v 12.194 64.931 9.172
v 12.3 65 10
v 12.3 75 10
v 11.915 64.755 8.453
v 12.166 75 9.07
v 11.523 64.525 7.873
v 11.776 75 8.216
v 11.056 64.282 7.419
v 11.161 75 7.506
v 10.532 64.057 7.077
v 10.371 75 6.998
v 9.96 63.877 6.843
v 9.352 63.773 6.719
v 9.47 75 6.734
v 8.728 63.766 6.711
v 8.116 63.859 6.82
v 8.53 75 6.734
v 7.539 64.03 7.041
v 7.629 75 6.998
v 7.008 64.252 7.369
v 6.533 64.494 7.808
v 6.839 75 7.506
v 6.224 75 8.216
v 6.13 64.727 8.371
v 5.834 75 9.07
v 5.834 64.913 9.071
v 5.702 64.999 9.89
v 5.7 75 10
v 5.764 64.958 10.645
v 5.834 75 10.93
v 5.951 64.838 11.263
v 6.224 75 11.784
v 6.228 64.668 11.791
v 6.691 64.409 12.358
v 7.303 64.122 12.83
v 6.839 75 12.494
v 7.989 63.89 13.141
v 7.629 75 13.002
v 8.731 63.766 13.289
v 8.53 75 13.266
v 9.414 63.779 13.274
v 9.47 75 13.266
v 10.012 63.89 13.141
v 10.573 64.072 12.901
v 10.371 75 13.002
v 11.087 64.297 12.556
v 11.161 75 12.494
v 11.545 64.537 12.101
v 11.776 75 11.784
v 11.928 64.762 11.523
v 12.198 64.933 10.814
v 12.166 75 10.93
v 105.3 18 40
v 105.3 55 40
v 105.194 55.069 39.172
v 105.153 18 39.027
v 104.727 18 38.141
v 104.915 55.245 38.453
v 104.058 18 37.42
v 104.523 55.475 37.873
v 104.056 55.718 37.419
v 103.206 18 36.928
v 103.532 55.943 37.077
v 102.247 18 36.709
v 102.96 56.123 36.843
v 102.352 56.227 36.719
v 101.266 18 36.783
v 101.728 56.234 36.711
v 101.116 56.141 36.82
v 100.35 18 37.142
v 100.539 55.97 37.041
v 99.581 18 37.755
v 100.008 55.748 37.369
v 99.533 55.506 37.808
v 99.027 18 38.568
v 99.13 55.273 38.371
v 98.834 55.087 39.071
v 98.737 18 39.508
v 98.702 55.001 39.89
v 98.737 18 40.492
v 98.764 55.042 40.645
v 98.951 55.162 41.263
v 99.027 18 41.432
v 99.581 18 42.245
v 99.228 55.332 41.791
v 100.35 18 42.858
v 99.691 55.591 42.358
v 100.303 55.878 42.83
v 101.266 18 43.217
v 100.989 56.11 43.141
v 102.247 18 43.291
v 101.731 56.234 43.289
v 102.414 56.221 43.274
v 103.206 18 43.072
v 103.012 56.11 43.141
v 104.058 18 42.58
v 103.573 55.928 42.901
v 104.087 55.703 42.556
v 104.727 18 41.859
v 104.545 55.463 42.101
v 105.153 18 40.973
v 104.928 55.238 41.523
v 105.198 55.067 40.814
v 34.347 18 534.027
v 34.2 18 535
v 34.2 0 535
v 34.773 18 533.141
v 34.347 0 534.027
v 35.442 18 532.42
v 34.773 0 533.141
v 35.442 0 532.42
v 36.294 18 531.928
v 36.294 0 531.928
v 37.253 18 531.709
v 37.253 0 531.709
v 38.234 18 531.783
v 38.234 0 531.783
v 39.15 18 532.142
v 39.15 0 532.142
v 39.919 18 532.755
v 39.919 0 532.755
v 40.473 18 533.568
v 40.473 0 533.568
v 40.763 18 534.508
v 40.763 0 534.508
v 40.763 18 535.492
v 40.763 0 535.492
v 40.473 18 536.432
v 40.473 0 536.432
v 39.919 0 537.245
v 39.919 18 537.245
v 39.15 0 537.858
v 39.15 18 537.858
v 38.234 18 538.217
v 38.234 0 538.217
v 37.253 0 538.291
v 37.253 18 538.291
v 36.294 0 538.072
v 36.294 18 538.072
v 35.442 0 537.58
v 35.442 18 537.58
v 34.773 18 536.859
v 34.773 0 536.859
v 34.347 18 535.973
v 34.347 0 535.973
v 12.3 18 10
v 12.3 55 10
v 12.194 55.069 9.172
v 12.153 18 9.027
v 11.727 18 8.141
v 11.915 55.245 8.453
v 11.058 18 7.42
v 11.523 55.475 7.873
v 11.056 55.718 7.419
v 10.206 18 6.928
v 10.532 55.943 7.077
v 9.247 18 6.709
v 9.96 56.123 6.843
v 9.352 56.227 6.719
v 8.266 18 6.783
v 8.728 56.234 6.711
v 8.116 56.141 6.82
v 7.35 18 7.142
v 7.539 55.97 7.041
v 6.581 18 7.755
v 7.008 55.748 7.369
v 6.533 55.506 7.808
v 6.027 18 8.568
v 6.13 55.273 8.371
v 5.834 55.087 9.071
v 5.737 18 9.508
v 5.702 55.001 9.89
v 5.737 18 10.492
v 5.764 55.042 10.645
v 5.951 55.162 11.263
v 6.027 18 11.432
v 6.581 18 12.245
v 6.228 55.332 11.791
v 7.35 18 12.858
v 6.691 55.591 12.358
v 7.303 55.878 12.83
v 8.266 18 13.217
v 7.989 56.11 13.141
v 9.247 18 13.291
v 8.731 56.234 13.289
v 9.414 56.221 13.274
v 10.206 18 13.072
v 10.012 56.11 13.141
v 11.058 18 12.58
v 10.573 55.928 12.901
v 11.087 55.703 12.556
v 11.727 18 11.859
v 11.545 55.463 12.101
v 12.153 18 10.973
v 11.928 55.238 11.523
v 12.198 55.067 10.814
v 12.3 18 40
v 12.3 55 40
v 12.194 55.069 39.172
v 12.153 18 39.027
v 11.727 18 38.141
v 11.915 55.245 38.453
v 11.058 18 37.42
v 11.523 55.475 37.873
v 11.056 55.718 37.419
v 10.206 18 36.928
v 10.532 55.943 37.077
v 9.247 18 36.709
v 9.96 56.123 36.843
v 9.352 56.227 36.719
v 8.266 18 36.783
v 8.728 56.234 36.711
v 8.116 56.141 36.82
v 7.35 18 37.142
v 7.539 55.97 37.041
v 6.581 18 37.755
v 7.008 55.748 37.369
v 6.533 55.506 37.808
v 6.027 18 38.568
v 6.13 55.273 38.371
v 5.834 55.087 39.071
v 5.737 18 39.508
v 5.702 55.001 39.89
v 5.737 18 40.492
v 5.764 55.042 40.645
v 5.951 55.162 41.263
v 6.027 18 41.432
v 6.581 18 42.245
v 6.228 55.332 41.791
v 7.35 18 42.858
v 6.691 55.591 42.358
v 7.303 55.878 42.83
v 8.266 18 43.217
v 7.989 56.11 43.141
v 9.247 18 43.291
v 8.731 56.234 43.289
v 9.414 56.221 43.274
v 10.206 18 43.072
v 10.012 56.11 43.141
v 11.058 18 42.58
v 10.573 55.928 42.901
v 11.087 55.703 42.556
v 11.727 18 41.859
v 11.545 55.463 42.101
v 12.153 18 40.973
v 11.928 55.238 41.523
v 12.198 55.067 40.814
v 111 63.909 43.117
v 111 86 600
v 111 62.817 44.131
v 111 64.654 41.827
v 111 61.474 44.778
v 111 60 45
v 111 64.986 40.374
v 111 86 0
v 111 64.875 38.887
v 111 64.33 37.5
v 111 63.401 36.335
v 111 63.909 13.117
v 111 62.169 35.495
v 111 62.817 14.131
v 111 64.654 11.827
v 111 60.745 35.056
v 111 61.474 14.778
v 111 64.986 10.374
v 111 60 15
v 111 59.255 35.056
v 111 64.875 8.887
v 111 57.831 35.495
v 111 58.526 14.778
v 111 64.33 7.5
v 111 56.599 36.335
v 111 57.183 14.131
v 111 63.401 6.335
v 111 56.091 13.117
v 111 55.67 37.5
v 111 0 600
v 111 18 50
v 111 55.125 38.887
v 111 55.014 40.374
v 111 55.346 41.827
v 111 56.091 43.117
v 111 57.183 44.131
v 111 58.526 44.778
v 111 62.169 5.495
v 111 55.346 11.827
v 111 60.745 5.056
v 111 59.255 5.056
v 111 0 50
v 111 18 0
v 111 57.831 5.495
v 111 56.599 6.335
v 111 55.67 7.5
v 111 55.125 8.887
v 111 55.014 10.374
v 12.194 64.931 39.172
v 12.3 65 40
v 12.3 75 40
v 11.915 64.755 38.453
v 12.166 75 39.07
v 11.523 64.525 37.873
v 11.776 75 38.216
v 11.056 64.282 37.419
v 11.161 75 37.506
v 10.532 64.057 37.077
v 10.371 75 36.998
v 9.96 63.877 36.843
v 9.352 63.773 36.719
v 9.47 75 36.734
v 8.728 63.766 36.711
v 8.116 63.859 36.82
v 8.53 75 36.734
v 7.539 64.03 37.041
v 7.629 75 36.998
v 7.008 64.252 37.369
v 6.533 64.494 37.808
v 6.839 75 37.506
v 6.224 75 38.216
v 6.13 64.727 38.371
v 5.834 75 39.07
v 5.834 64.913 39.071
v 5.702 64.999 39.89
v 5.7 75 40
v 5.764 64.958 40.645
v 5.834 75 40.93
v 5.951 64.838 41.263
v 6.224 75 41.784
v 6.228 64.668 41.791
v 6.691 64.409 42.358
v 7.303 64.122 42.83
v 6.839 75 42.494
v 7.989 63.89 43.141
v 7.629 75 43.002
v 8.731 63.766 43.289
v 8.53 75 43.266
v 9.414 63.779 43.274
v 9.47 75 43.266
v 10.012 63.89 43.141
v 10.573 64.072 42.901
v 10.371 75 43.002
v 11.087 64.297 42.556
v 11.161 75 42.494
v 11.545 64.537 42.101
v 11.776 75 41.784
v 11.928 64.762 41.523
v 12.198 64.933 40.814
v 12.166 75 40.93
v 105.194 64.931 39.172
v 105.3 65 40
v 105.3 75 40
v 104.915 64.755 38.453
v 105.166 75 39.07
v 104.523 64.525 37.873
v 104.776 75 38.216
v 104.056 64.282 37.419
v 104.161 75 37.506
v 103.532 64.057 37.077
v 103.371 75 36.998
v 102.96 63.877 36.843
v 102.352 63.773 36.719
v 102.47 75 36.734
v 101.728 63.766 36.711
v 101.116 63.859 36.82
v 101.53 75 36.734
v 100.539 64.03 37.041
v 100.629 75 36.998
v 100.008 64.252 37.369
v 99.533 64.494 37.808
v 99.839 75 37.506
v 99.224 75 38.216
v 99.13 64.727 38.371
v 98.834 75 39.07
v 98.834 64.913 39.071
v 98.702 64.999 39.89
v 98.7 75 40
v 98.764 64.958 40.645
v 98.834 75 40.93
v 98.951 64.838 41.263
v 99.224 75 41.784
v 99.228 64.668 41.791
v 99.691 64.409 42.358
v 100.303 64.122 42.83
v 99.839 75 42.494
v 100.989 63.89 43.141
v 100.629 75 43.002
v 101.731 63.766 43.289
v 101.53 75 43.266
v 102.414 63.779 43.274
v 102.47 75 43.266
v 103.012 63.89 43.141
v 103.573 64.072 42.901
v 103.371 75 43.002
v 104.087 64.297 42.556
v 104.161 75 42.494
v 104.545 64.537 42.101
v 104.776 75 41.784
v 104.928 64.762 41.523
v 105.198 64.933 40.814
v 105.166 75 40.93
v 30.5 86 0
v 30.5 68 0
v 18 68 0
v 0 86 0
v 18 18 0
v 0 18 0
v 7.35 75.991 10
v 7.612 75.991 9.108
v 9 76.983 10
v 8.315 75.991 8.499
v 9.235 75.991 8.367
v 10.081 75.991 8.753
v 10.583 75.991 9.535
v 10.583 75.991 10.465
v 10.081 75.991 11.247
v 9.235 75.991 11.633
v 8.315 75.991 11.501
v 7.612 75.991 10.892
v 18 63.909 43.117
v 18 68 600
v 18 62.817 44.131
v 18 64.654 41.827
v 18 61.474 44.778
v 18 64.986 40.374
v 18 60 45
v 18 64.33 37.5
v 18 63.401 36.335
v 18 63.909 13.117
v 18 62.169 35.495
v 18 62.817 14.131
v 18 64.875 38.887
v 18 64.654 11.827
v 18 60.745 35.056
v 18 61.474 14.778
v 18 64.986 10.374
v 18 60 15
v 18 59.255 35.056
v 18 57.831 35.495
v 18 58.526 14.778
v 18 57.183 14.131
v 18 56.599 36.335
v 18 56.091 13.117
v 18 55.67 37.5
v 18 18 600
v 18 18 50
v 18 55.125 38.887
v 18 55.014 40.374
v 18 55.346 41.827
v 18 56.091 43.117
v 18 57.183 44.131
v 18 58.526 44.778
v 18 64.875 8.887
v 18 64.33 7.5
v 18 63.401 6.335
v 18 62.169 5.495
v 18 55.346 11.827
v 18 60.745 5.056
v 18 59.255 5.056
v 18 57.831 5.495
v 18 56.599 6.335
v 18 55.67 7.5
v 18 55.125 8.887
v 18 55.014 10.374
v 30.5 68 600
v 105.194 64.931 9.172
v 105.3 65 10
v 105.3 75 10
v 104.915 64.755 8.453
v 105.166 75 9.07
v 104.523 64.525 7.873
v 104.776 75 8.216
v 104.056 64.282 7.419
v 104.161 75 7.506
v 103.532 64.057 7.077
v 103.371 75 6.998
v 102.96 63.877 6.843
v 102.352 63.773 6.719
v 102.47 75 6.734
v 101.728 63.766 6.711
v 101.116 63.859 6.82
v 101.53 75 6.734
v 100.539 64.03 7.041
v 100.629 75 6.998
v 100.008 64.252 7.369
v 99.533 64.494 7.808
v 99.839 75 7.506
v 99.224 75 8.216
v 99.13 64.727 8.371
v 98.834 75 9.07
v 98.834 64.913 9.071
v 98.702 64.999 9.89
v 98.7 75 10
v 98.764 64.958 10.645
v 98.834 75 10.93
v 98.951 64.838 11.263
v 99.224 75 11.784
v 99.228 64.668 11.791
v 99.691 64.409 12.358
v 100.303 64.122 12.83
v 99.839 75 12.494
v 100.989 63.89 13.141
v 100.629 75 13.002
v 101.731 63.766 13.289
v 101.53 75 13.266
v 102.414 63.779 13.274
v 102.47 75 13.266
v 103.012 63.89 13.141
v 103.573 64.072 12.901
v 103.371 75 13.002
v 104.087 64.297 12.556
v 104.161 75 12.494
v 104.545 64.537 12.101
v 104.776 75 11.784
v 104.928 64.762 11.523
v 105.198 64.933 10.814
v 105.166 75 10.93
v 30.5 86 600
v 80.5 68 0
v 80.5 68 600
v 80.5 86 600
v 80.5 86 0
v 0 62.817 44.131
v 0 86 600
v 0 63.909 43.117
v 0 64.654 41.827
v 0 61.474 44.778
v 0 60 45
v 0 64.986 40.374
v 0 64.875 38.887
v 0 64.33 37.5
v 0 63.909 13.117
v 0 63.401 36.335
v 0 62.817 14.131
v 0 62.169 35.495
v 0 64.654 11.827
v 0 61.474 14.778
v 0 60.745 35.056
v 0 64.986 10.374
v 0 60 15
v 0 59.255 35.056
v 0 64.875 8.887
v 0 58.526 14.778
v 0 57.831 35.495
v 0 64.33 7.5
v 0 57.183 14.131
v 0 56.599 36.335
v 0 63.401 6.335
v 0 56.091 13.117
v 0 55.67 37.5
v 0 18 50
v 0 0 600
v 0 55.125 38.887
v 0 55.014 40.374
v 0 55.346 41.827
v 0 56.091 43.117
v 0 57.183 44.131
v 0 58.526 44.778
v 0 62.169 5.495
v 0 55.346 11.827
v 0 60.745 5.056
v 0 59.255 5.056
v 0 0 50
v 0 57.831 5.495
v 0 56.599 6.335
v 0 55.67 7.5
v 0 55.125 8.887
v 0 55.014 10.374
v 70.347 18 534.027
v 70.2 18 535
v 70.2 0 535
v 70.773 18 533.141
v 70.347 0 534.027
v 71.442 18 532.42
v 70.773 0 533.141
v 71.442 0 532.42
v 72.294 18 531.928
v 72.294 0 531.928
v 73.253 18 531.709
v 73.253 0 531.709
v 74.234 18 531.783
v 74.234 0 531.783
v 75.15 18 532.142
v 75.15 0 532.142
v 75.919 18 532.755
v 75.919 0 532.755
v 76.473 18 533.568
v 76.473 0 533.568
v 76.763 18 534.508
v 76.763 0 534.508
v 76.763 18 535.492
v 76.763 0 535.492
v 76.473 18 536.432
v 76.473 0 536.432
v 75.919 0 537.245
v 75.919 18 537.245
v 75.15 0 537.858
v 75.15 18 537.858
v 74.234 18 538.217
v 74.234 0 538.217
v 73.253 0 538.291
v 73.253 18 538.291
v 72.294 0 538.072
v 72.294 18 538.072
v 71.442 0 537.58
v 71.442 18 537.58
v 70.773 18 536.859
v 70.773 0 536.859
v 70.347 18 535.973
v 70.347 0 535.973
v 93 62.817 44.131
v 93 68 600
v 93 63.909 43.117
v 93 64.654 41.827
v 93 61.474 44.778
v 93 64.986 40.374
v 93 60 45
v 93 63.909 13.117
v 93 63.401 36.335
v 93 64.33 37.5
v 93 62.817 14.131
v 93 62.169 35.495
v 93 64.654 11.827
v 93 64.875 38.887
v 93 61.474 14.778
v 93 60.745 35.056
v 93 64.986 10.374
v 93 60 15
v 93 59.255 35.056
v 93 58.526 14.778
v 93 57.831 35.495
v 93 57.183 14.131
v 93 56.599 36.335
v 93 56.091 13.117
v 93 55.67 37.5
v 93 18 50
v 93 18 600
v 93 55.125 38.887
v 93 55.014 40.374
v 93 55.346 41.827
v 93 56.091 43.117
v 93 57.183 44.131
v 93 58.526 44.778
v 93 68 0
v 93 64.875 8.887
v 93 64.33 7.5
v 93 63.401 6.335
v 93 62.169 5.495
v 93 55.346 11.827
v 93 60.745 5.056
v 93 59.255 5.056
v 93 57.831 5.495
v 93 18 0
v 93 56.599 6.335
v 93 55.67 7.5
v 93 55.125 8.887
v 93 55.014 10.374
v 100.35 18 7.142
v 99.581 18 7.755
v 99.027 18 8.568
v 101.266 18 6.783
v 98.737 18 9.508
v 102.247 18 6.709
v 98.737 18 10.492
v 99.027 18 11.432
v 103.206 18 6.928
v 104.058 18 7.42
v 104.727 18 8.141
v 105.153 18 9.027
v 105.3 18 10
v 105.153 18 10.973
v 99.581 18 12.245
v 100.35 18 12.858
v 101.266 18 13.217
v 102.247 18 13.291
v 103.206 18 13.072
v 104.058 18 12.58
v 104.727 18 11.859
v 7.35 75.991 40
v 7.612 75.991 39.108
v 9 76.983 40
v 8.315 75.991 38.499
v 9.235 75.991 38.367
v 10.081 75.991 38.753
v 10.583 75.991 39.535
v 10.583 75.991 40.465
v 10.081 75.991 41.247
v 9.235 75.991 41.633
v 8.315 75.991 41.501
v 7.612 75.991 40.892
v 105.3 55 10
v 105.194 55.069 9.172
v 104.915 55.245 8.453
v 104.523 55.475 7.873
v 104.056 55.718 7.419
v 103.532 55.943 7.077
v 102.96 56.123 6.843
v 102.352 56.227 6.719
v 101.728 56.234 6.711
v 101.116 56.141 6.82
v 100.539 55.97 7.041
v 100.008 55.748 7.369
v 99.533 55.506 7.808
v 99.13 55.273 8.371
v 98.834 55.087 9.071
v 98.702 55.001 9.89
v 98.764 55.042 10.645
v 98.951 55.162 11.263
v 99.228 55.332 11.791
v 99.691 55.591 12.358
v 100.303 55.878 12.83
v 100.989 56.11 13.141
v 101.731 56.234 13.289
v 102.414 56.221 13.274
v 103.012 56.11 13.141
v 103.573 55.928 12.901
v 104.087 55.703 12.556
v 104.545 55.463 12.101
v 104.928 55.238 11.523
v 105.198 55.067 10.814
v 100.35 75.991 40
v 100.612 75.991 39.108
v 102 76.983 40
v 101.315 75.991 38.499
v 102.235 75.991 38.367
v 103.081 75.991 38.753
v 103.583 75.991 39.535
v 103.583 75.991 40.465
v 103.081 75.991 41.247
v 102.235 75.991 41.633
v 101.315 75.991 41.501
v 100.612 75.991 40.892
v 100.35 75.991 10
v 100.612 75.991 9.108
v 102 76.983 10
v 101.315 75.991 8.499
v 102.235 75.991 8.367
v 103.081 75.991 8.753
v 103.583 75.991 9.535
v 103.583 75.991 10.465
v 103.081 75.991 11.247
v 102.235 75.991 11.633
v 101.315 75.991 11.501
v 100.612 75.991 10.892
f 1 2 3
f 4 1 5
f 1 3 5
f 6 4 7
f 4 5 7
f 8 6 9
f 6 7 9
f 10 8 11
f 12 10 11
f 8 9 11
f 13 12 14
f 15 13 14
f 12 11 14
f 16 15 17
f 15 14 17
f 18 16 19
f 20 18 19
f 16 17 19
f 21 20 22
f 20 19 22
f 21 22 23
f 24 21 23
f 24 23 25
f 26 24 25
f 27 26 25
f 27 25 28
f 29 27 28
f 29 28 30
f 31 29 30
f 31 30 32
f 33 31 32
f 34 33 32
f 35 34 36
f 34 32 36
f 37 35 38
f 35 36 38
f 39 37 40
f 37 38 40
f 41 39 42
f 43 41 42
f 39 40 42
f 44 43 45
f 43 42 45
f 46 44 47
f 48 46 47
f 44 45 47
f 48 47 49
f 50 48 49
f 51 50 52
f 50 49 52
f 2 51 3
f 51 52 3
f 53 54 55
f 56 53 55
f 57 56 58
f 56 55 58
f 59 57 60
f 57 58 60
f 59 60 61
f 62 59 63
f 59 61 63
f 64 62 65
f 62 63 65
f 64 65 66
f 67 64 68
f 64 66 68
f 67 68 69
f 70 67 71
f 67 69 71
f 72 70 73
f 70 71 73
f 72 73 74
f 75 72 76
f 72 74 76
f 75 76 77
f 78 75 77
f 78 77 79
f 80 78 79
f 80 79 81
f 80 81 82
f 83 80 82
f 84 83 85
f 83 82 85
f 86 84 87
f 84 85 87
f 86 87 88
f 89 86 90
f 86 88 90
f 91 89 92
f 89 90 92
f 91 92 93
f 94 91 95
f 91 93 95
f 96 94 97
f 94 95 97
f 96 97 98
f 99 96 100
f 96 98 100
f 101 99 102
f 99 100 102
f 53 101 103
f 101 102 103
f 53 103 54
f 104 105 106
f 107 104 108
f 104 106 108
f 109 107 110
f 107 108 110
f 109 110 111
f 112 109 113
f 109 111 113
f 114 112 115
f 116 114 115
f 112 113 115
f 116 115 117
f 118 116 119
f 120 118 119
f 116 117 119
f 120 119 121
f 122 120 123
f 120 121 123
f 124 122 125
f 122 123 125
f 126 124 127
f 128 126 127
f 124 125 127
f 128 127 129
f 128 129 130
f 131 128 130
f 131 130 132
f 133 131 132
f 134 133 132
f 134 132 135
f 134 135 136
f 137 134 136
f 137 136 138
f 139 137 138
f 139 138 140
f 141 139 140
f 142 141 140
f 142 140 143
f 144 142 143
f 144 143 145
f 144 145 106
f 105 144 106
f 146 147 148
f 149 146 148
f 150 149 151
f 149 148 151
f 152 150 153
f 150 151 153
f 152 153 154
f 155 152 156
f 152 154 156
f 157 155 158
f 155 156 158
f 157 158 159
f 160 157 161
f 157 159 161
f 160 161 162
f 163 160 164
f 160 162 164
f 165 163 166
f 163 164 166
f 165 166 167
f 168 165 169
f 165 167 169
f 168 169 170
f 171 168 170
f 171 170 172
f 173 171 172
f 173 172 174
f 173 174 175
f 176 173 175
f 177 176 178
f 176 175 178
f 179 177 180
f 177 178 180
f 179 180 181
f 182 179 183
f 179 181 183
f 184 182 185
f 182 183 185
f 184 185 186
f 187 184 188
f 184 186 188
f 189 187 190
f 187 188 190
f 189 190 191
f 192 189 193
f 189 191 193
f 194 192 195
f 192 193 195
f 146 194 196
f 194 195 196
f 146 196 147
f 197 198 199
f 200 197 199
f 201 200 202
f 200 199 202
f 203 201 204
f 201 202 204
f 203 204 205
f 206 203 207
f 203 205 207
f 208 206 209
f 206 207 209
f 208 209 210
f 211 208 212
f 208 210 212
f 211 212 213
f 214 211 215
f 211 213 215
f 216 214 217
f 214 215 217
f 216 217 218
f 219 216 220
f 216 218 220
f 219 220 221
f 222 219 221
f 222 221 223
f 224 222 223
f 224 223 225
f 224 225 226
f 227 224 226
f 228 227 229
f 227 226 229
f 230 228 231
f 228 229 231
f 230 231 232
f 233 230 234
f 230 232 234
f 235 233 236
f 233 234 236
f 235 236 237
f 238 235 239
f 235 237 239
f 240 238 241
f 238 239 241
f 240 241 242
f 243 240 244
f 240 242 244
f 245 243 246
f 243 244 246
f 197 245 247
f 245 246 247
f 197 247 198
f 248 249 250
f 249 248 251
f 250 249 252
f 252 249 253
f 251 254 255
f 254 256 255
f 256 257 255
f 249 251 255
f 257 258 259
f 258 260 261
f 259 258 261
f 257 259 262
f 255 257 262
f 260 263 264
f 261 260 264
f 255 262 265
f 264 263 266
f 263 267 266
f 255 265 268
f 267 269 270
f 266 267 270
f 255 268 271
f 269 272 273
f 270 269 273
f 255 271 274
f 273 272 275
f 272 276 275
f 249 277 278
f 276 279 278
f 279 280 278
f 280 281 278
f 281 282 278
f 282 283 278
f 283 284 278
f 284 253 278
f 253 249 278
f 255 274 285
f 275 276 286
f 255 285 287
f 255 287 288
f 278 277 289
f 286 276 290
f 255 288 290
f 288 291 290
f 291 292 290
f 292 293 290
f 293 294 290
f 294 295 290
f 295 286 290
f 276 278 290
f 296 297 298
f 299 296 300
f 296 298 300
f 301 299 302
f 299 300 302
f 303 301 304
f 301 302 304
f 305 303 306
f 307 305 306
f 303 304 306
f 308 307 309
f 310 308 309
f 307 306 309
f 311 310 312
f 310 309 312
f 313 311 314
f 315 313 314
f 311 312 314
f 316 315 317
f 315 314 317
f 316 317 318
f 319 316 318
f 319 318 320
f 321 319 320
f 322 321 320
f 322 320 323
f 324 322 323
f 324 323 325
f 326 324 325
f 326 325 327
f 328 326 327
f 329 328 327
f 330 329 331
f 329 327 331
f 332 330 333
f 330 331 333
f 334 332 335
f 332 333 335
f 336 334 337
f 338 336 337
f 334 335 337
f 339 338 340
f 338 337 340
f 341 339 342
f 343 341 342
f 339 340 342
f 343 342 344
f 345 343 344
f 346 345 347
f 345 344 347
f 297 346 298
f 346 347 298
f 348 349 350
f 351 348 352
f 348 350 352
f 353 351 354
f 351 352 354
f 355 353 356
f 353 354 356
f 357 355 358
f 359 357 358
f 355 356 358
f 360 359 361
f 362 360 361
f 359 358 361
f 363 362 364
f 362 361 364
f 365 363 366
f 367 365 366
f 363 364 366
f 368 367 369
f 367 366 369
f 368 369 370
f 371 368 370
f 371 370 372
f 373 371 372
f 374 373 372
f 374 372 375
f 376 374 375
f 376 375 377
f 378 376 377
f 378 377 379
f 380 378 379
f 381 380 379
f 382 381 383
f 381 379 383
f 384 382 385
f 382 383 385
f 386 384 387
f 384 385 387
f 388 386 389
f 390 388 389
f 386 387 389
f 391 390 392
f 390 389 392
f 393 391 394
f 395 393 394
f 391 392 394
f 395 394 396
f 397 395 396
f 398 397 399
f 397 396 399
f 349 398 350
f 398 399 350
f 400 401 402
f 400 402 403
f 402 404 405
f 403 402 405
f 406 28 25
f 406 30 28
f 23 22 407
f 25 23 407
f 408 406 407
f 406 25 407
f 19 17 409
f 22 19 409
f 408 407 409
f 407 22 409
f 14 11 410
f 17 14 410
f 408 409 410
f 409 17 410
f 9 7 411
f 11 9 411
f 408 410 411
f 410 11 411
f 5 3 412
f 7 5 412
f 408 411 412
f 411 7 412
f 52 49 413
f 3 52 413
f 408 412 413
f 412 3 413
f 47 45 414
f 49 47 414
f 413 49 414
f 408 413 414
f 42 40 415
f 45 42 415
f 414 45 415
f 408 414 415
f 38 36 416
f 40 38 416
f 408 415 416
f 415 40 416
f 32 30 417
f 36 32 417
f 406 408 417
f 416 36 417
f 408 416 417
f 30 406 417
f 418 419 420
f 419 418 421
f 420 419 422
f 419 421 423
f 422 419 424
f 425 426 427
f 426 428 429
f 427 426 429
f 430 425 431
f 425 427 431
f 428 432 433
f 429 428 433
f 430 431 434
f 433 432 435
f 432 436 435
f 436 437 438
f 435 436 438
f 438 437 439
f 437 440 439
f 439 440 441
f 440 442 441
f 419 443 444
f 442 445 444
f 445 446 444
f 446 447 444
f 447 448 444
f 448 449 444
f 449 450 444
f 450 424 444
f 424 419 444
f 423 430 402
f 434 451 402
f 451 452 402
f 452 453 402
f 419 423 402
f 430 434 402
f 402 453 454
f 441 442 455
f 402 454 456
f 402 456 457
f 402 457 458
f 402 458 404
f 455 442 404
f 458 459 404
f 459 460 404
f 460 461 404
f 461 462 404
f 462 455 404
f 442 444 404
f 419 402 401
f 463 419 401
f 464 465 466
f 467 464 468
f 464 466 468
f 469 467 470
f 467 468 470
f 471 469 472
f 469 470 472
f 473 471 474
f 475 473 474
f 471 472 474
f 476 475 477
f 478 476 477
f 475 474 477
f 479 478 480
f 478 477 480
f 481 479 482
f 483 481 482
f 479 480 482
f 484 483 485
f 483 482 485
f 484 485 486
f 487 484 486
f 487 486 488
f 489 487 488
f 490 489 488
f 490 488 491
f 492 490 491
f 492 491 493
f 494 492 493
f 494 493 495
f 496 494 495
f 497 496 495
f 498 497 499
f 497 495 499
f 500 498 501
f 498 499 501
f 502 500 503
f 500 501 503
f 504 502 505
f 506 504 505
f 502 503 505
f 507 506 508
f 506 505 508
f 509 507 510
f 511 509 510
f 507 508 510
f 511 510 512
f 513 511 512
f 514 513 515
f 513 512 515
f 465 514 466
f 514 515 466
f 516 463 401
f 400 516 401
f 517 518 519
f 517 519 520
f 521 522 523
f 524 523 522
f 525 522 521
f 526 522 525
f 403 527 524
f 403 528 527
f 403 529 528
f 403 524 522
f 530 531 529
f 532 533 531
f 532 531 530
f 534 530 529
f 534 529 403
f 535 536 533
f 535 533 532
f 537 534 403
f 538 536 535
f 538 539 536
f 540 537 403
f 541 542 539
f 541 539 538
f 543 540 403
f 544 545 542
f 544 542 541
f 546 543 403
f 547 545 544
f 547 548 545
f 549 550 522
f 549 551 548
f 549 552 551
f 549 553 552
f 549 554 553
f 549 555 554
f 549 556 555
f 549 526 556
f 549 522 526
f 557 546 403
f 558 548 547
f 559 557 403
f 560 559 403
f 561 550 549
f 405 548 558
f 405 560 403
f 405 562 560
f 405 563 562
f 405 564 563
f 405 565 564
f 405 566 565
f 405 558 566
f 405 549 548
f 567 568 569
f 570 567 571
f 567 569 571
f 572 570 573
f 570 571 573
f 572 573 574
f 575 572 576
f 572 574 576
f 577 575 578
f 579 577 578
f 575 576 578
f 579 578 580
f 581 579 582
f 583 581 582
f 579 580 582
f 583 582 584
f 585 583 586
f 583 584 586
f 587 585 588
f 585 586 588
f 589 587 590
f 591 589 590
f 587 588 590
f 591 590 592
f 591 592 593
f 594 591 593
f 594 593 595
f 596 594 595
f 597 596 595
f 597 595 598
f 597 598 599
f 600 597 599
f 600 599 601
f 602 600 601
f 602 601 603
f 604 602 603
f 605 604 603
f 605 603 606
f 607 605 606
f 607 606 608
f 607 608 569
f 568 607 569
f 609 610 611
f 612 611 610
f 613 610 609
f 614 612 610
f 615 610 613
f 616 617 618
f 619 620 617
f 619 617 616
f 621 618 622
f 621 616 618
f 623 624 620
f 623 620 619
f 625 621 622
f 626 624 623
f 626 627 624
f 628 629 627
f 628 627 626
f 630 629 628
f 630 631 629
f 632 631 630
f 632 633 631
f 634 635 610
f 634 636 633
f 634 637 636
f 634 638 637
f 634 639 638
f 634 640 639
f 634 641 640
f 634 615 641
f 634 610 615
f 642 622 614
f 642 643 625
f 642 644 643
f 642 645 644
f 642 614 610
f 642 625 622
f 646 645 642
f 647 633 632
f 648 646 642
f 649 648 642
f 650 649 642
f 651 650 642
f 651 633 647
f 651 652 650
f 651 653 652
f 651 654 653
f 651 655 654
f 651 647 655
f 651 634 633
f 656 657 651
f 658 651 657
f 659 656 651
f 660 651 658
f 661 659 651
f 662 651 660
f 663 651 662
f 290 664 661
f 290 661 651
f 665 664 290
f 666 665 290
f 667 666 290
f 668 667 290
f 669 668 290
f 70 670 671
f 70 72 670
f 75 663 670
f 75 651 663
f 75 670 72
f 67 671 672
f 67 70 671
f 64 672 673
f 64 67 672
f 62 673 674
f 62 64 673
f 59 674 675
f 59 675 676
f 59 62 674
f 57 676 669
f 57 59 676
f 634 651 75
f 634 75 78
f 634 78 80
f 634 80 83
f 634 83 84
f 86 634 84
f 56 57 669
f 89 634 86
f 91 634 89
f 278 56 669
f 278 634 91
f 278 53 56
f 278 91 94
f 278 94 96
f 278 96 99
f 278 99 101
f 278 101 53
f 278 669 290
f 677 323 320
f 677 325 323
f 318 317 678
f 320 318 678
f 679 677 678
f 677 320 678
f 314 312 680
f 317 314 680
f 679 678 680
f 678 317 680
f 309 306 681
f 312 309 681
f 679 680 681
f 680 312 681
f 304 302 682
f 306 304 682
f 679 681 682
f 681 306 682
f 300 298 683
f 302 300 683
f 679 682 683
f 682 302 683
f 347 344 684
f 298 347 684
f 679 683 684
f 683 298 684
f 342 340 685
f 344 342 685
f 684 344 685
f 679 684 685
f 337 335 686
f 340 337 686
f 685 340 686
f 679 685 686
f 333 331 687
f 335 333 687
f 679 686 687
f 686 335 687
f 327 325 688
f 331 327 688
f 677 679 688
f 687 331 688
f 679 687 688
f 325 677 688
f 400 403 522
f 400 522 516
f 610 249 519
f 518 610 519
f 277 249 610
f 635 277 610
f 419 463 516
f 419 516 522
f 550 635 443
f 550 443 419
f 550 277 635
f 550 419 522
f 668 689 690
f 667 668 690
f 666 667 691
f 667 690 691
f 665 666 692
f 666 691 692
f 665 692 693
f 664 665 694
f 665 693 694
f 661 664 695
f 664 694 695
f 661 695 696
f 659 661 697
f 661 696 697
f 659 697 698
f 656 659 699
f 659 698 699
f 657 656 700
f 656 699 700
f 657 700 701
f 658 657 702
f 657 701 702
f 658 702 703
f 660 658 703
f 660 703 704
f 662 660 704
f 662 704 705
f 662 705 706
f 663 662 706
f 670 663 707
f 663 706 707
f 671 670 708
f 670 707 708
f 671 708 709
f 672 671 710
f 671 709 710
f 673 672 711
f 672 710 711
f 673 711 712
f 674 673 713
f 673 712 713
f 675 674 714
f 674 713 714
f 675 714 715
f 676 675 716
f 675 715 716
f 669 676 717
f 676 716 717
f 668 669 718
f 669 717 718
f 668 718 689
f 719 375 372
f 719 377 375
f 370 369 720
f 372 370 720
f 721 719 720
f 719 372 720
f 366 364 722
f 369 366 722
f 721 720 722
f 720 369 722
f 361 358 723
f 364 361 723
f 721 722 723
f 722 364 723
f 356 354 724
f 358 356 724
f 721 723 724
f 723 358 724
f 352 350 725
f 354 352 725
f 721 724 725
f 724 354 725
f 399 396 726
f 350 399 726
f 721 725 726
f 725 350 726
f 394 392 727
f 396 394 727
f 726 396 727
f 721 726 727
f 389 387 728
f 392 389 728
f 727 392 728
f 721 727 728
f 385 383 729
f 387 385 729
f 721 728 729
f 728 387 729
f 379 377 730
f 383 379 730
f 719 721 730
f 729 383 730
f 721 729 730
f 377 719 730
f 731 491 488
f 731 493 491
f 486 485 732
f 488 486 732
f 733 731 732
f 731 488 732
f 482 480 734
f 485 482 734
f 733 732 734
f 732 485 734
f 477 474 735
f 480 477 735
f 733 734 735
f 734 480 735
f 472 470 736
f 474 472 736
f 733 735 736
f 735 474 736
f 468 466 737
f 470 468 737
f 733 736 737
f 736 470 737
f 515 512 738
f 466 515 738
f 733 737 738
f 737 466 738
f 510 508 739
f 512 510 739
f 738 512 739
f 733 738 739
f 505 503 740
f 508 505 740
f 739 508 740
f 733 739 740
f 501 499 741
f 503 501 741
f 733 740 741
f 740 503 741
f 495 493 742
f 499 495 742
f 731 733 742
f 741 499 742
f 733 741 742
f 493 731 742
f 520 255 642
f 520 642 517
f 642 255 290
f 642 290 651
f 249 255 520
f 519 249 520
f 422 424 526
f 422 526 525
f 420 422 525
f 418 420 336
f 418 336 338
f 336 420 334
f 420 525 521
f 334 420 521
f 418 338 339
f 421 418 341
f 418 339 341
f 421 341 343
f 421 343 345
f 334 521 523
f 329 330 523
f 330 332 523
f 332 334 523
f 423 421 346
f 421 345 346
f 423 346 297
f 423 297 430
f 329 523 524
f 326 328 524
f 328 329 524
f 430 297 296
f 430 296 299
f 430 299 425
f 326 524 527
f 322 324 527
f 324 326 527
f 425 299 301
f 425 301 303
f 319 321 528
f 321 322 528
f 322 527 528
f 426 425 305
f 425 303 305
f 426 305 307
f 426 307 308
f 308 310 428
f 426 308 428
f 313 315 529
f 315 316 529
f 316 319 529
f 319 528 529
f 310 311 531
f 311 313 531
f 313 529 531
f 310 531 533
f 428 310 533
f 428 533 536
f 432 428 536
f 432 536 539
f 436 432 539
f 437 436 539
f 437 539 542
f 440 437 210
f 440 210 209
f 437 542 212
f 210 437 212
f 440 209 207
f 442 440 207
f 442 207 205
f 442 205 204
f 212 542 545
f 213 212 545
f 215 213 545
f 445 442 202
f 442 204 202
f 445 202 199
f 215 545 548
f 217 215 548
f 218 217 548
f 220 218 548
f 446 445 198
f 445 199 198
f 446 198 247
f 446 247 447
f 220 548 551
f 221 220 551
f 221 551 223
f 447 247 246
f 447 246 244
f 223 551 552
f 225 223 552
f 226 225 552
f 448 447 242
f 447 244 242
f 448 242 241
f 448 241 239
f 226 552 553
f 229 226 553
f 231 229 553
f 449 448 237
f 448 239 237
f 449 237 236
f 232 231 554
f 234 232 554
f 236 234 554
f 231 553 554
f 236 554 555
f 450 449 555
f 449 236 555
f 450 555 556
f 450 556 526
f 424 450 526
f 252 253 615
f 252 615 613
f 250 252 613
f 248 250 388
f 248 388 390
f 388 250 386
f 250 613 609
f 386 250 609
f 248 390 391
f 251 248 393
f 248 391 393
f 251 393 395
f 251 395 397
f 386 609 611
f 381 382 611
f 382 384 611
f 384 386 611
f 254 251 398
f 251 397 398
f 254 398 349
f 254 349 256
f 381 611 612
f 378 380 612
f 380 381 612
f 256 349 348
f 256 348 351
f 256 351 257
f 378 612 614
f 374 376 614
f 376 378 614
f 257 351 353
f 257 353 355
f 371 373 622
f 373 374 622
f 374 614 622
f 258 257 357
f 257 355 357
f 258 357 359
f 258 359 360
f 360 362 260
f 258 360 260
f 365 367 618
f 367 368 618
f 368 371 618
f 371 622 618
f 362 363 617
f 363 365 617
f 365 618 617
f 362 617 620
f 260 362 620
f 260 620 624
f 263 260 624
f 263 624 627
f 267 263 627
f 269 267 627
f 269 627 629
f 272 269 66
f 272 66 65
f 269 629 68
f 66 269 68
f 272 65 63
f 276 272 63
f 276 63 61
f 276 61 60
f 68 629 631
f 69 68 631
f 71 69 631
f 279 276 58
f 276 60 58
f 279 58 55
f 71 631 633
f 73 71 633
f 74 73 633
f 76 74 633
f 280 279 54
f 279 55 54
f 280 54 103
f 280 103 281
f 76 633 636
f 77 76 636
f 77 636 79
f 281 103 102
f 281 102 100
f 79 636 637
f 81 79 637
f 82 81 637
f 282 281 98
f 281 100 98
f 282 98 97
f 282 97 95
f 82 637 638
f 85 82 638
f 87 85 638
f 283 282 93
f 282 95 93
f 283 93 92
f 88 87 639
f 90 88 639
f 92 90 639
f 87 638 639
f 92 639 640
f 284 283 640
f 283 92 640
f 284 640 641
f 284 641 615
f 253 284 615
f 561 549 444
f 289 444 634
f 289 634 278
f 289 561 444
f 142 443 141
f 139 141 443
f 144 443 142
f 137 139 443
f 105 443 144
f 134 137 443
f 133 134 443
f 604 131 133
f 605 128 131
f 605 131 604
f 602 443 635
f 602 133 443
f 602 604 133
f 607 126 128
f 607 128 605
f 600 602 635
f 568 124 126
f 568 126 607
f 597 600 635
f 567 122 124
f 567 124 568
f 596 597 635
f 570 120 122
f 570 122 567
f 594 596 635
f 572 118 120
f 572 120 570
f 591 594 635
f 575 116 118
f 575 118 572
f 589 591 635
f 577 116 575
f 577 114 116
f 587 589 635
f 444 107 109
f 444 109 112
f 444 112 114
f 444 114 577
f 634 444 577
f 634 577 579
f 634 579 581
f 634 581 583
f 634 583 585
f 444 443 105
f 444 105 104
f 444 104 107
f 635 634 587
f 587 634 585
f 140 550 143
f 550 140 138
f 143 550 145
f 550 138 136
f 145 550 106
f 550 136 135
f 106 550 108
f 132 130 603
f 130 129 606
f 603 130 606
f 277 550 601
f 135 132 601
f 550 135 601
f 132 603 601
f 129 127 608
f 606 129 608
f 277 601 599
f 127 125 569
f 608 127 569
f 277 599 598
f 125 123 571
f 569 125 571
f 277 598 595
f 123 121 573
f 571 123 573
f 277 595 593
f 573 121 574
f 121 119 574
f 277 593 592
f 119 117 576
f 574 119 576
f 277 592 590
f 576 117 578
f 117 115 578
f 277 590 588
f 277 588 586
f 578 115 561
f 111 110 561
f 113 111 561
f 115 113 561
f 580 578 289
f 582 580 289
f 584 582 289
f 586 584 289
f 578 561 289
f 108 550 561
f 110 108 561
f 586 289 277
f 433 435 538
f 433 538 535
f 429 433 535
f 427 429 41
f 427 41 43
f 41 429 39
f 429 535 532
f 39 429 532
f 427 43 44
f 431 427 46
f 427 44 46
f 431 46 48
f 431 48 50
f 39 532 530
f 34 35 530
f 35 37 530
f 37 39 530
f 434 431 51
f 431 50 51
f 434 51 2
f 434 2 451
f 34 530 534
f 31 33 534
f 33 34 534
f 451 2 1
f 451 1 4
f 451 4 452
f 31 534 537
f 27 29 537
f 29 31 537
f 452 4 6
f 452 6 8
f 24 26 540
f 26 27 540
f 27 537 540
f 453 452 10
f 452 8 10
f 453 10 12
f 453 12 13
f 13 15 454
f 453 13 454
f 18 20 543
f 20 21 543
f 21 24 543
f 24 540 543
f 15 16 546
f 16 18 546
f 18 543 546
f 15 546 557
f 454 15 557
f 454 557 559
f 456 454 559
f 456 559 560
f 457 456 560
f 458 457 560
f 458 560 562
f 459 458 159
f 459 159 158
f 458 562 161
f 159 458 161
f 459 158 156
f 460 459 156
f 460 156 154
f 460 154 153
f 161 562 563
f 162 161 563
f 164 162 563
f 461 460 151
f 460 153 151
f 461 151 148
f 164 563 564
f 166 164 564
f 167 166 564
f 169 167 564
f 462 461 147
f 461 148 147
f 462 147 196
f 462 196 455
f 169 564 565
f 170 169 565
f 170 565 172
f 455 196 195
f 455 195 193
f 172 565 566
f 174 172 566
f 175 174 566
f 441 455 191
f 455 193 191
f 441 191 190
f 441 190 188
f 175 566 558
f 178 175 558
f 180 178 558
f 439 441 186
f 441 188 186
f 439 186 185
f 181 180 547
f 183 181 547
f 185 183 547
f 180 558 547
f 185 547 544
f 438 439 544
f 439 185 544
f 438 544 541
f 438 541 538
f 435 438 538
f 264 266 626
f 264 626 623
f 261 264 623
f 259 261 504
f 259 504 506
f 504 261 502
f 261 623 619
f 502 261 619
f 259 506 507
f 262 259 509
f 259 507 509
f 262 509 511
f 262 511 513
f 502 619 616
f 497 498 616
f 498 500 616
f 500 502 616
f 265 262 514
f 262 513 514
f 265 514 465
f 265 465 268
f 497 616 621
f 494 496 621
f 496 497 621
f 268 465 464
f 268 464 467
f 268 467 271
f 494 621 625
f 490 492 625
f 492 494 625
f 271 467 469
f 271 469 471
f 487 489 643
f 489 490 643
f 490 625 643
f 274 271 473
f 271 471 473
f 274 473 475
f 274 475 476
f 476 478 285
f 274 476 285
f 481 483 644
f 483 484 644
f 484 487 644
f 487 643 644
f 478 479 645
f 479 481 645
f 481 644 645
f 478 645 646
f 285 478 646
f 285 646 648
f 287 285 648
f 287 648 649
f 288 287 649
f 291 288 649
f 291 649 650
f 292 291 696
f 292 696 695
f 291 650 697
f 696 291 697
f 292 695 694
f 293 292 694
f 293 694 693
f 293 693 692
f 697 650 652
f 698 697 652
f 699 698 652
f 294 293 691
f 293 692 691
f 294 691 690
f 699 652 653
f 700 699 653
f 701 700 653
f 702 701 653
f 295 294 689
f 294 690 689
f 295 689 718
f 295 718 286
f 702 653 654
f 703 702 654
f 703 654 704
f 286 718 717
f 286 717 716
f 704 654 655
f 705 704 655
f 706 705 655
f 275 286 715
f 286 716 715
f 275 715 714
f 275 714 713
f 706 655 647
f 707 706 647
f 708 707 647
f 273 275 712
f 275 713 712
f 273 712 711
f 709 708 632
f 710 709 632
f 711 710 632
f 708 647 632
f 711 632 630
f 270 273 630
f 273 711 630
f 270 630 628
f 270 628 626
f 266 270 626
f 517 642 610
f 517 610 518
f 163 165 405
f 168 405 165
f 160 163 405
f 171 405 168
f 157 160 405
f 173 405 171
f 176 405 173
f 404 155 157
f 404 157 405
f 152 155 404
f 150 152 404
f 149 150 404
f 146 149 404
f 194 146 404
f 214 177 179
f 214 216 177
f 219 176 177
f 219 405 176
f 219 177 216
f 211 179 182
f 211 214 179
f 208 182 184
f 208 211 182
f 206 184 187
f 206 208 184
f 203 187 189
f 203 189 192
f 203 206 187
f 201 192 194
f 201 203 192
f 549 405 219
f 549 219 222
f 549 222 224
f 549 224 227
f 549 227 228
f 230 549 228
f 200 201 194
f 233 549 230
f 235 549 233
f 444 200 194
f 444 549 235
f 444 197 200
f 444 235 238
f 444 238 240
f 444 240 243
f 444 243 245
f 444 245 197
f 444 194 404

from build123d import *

# Parameters (mm, degrees)
SKETCH1_W                                  = 111
SKETCH1_H                                  = 18
BASEPLATE_DEPTH                            = 600
SKETCH2_W                                  = 18
SKETCH2_H                                  = 600
SIDE_RAIL_DEPTH                            = 50
SKETCH3_W                                  = 30.5
SKETCH3_H                                  = 600
KEEPER_RAIL_DEPTH                          = 18
SKETCH5_W                                  = 111
SKETCH5_H                                  = 50
LAP_JOINT_CUTOUT_DEPTH                     = 18
LAP_JOINT_BOLT_HOLE_PATTERN_D              = 6.6
LAP_JOINT_BOLT_HOLE_PATTERN_DEPTH          = 57
LAP_JOINT_BOLT_HOLE_PATTERN_TIP            = 1.982840043
FIXED_BEARING_BLOCK_BOLT_CLEARANCE_HOLES_D = 6.6
CROSS_DOWEL_BOLT_CLEARANCE_HOLES_D         = 10


with BuildPart() as part:
    # Sketch1 → baseplate (new body)
    with BuildSketch(Plane.XY):
        with Locations((55.5, 9)):
            Rectangle(SKETCH1_W, SKETCH1_H)
    extrude(amount=BASEPLATE_DEPTH)

    # Sketch2 → side_rail (add)
    with BuildSketch(Plane(origin=(0, 18, 0), x_dir=(1, 0, 0), z_dir=(0, 1, 0))):
        with Locations((9, -300)):
            Rectangle(SKETCH2_W, SKETCH2_H)
    side_rail = extrude(amount=SIDE_RAIL_DEPTH)

    # Sketch3 → keeper rail (add)
    with BuildSketch(Plane(origin=(0, 68, 0), x_dir=(1, 0, 0), z_dir=(0, 1, 0))):
        with Locations((15.25, -300)):
            Rectangle(SKETCH3_W, SKETCH3_H)
    keeper_rail = extrude(amount=KEEPER_RAIL_DEPTH)

    # mirror rails: side_rail, keeper rail across plane
    add(side_rail.mirror(Plane.ZY.offset(-55.5)))
    add(keeper_rail.mirror(Plane.ZY.offset(-55.5)))

    # Sketch5 → lap joint cutout (cut)
    with BuildSketch(Plane.XZ):
        with Locations((55.5, 25)):
            Rectangle(SKETCH5_W, SKETCH5_H)
    extrude(amount=-LAP_JOINT_CUTOUT_DEPTH, mode=Mode.SUBTRACT)

    # lap joint bolt hole pattern
    with Locations(Plane(origin=(0, 18, 0), x_dir=(-1, 0, 0), z_dir=(0, -1, 0))):
        with Locations((-102, -10), (-9, -40), (-102, -40), (-9, -10)):
            Hole(LAP_JOINT_BOLT_HOLE_PATTERN_D / 2, depth=LAP_JOINT_BOLT_HOLE_PATTERN_DEPTH)
            with Locations((0, 0, -(LAP_JOINT_BOLT_HOLE_PATTERN_DEPTH + LAP_JOINT_BOLT_HOLE_PATTERN_TIP / 2))):  # 118° drill point
                Cone(0, LAP_JOINT_BOLT_HOLE_PATTERN_D / 2, LAP_JOINT_BOLT_HOLE_PATTERN_TIP, mode=Mode.SUBTRACT)

    # fixed bearing block bolt clearance holes (through all)
    with Locations(Plane(origin=(0, 18, 0), x_dir=(1, 0, 0), z_dir=(0, 1, 0))):
        with Locations((37.5, -535), (73.5, -535)):
            Hole(FIXED_BEARING_BLOCK_BOLT_CLEARANCE_HOLES_D / 2)

    # cross dowel bolt clearance holes (through all)
    with Locations(Plane(origin=(111, 0, 0), x_dir=(0, 0, -1), z_dir=(1, 0, 0))):
        with Locations((-40, 60), (-10, 60)):
            Hole(CROSS_DOWEL_BOLT_CLEARANCE_HOLES_D / 2)


solid = part.part
